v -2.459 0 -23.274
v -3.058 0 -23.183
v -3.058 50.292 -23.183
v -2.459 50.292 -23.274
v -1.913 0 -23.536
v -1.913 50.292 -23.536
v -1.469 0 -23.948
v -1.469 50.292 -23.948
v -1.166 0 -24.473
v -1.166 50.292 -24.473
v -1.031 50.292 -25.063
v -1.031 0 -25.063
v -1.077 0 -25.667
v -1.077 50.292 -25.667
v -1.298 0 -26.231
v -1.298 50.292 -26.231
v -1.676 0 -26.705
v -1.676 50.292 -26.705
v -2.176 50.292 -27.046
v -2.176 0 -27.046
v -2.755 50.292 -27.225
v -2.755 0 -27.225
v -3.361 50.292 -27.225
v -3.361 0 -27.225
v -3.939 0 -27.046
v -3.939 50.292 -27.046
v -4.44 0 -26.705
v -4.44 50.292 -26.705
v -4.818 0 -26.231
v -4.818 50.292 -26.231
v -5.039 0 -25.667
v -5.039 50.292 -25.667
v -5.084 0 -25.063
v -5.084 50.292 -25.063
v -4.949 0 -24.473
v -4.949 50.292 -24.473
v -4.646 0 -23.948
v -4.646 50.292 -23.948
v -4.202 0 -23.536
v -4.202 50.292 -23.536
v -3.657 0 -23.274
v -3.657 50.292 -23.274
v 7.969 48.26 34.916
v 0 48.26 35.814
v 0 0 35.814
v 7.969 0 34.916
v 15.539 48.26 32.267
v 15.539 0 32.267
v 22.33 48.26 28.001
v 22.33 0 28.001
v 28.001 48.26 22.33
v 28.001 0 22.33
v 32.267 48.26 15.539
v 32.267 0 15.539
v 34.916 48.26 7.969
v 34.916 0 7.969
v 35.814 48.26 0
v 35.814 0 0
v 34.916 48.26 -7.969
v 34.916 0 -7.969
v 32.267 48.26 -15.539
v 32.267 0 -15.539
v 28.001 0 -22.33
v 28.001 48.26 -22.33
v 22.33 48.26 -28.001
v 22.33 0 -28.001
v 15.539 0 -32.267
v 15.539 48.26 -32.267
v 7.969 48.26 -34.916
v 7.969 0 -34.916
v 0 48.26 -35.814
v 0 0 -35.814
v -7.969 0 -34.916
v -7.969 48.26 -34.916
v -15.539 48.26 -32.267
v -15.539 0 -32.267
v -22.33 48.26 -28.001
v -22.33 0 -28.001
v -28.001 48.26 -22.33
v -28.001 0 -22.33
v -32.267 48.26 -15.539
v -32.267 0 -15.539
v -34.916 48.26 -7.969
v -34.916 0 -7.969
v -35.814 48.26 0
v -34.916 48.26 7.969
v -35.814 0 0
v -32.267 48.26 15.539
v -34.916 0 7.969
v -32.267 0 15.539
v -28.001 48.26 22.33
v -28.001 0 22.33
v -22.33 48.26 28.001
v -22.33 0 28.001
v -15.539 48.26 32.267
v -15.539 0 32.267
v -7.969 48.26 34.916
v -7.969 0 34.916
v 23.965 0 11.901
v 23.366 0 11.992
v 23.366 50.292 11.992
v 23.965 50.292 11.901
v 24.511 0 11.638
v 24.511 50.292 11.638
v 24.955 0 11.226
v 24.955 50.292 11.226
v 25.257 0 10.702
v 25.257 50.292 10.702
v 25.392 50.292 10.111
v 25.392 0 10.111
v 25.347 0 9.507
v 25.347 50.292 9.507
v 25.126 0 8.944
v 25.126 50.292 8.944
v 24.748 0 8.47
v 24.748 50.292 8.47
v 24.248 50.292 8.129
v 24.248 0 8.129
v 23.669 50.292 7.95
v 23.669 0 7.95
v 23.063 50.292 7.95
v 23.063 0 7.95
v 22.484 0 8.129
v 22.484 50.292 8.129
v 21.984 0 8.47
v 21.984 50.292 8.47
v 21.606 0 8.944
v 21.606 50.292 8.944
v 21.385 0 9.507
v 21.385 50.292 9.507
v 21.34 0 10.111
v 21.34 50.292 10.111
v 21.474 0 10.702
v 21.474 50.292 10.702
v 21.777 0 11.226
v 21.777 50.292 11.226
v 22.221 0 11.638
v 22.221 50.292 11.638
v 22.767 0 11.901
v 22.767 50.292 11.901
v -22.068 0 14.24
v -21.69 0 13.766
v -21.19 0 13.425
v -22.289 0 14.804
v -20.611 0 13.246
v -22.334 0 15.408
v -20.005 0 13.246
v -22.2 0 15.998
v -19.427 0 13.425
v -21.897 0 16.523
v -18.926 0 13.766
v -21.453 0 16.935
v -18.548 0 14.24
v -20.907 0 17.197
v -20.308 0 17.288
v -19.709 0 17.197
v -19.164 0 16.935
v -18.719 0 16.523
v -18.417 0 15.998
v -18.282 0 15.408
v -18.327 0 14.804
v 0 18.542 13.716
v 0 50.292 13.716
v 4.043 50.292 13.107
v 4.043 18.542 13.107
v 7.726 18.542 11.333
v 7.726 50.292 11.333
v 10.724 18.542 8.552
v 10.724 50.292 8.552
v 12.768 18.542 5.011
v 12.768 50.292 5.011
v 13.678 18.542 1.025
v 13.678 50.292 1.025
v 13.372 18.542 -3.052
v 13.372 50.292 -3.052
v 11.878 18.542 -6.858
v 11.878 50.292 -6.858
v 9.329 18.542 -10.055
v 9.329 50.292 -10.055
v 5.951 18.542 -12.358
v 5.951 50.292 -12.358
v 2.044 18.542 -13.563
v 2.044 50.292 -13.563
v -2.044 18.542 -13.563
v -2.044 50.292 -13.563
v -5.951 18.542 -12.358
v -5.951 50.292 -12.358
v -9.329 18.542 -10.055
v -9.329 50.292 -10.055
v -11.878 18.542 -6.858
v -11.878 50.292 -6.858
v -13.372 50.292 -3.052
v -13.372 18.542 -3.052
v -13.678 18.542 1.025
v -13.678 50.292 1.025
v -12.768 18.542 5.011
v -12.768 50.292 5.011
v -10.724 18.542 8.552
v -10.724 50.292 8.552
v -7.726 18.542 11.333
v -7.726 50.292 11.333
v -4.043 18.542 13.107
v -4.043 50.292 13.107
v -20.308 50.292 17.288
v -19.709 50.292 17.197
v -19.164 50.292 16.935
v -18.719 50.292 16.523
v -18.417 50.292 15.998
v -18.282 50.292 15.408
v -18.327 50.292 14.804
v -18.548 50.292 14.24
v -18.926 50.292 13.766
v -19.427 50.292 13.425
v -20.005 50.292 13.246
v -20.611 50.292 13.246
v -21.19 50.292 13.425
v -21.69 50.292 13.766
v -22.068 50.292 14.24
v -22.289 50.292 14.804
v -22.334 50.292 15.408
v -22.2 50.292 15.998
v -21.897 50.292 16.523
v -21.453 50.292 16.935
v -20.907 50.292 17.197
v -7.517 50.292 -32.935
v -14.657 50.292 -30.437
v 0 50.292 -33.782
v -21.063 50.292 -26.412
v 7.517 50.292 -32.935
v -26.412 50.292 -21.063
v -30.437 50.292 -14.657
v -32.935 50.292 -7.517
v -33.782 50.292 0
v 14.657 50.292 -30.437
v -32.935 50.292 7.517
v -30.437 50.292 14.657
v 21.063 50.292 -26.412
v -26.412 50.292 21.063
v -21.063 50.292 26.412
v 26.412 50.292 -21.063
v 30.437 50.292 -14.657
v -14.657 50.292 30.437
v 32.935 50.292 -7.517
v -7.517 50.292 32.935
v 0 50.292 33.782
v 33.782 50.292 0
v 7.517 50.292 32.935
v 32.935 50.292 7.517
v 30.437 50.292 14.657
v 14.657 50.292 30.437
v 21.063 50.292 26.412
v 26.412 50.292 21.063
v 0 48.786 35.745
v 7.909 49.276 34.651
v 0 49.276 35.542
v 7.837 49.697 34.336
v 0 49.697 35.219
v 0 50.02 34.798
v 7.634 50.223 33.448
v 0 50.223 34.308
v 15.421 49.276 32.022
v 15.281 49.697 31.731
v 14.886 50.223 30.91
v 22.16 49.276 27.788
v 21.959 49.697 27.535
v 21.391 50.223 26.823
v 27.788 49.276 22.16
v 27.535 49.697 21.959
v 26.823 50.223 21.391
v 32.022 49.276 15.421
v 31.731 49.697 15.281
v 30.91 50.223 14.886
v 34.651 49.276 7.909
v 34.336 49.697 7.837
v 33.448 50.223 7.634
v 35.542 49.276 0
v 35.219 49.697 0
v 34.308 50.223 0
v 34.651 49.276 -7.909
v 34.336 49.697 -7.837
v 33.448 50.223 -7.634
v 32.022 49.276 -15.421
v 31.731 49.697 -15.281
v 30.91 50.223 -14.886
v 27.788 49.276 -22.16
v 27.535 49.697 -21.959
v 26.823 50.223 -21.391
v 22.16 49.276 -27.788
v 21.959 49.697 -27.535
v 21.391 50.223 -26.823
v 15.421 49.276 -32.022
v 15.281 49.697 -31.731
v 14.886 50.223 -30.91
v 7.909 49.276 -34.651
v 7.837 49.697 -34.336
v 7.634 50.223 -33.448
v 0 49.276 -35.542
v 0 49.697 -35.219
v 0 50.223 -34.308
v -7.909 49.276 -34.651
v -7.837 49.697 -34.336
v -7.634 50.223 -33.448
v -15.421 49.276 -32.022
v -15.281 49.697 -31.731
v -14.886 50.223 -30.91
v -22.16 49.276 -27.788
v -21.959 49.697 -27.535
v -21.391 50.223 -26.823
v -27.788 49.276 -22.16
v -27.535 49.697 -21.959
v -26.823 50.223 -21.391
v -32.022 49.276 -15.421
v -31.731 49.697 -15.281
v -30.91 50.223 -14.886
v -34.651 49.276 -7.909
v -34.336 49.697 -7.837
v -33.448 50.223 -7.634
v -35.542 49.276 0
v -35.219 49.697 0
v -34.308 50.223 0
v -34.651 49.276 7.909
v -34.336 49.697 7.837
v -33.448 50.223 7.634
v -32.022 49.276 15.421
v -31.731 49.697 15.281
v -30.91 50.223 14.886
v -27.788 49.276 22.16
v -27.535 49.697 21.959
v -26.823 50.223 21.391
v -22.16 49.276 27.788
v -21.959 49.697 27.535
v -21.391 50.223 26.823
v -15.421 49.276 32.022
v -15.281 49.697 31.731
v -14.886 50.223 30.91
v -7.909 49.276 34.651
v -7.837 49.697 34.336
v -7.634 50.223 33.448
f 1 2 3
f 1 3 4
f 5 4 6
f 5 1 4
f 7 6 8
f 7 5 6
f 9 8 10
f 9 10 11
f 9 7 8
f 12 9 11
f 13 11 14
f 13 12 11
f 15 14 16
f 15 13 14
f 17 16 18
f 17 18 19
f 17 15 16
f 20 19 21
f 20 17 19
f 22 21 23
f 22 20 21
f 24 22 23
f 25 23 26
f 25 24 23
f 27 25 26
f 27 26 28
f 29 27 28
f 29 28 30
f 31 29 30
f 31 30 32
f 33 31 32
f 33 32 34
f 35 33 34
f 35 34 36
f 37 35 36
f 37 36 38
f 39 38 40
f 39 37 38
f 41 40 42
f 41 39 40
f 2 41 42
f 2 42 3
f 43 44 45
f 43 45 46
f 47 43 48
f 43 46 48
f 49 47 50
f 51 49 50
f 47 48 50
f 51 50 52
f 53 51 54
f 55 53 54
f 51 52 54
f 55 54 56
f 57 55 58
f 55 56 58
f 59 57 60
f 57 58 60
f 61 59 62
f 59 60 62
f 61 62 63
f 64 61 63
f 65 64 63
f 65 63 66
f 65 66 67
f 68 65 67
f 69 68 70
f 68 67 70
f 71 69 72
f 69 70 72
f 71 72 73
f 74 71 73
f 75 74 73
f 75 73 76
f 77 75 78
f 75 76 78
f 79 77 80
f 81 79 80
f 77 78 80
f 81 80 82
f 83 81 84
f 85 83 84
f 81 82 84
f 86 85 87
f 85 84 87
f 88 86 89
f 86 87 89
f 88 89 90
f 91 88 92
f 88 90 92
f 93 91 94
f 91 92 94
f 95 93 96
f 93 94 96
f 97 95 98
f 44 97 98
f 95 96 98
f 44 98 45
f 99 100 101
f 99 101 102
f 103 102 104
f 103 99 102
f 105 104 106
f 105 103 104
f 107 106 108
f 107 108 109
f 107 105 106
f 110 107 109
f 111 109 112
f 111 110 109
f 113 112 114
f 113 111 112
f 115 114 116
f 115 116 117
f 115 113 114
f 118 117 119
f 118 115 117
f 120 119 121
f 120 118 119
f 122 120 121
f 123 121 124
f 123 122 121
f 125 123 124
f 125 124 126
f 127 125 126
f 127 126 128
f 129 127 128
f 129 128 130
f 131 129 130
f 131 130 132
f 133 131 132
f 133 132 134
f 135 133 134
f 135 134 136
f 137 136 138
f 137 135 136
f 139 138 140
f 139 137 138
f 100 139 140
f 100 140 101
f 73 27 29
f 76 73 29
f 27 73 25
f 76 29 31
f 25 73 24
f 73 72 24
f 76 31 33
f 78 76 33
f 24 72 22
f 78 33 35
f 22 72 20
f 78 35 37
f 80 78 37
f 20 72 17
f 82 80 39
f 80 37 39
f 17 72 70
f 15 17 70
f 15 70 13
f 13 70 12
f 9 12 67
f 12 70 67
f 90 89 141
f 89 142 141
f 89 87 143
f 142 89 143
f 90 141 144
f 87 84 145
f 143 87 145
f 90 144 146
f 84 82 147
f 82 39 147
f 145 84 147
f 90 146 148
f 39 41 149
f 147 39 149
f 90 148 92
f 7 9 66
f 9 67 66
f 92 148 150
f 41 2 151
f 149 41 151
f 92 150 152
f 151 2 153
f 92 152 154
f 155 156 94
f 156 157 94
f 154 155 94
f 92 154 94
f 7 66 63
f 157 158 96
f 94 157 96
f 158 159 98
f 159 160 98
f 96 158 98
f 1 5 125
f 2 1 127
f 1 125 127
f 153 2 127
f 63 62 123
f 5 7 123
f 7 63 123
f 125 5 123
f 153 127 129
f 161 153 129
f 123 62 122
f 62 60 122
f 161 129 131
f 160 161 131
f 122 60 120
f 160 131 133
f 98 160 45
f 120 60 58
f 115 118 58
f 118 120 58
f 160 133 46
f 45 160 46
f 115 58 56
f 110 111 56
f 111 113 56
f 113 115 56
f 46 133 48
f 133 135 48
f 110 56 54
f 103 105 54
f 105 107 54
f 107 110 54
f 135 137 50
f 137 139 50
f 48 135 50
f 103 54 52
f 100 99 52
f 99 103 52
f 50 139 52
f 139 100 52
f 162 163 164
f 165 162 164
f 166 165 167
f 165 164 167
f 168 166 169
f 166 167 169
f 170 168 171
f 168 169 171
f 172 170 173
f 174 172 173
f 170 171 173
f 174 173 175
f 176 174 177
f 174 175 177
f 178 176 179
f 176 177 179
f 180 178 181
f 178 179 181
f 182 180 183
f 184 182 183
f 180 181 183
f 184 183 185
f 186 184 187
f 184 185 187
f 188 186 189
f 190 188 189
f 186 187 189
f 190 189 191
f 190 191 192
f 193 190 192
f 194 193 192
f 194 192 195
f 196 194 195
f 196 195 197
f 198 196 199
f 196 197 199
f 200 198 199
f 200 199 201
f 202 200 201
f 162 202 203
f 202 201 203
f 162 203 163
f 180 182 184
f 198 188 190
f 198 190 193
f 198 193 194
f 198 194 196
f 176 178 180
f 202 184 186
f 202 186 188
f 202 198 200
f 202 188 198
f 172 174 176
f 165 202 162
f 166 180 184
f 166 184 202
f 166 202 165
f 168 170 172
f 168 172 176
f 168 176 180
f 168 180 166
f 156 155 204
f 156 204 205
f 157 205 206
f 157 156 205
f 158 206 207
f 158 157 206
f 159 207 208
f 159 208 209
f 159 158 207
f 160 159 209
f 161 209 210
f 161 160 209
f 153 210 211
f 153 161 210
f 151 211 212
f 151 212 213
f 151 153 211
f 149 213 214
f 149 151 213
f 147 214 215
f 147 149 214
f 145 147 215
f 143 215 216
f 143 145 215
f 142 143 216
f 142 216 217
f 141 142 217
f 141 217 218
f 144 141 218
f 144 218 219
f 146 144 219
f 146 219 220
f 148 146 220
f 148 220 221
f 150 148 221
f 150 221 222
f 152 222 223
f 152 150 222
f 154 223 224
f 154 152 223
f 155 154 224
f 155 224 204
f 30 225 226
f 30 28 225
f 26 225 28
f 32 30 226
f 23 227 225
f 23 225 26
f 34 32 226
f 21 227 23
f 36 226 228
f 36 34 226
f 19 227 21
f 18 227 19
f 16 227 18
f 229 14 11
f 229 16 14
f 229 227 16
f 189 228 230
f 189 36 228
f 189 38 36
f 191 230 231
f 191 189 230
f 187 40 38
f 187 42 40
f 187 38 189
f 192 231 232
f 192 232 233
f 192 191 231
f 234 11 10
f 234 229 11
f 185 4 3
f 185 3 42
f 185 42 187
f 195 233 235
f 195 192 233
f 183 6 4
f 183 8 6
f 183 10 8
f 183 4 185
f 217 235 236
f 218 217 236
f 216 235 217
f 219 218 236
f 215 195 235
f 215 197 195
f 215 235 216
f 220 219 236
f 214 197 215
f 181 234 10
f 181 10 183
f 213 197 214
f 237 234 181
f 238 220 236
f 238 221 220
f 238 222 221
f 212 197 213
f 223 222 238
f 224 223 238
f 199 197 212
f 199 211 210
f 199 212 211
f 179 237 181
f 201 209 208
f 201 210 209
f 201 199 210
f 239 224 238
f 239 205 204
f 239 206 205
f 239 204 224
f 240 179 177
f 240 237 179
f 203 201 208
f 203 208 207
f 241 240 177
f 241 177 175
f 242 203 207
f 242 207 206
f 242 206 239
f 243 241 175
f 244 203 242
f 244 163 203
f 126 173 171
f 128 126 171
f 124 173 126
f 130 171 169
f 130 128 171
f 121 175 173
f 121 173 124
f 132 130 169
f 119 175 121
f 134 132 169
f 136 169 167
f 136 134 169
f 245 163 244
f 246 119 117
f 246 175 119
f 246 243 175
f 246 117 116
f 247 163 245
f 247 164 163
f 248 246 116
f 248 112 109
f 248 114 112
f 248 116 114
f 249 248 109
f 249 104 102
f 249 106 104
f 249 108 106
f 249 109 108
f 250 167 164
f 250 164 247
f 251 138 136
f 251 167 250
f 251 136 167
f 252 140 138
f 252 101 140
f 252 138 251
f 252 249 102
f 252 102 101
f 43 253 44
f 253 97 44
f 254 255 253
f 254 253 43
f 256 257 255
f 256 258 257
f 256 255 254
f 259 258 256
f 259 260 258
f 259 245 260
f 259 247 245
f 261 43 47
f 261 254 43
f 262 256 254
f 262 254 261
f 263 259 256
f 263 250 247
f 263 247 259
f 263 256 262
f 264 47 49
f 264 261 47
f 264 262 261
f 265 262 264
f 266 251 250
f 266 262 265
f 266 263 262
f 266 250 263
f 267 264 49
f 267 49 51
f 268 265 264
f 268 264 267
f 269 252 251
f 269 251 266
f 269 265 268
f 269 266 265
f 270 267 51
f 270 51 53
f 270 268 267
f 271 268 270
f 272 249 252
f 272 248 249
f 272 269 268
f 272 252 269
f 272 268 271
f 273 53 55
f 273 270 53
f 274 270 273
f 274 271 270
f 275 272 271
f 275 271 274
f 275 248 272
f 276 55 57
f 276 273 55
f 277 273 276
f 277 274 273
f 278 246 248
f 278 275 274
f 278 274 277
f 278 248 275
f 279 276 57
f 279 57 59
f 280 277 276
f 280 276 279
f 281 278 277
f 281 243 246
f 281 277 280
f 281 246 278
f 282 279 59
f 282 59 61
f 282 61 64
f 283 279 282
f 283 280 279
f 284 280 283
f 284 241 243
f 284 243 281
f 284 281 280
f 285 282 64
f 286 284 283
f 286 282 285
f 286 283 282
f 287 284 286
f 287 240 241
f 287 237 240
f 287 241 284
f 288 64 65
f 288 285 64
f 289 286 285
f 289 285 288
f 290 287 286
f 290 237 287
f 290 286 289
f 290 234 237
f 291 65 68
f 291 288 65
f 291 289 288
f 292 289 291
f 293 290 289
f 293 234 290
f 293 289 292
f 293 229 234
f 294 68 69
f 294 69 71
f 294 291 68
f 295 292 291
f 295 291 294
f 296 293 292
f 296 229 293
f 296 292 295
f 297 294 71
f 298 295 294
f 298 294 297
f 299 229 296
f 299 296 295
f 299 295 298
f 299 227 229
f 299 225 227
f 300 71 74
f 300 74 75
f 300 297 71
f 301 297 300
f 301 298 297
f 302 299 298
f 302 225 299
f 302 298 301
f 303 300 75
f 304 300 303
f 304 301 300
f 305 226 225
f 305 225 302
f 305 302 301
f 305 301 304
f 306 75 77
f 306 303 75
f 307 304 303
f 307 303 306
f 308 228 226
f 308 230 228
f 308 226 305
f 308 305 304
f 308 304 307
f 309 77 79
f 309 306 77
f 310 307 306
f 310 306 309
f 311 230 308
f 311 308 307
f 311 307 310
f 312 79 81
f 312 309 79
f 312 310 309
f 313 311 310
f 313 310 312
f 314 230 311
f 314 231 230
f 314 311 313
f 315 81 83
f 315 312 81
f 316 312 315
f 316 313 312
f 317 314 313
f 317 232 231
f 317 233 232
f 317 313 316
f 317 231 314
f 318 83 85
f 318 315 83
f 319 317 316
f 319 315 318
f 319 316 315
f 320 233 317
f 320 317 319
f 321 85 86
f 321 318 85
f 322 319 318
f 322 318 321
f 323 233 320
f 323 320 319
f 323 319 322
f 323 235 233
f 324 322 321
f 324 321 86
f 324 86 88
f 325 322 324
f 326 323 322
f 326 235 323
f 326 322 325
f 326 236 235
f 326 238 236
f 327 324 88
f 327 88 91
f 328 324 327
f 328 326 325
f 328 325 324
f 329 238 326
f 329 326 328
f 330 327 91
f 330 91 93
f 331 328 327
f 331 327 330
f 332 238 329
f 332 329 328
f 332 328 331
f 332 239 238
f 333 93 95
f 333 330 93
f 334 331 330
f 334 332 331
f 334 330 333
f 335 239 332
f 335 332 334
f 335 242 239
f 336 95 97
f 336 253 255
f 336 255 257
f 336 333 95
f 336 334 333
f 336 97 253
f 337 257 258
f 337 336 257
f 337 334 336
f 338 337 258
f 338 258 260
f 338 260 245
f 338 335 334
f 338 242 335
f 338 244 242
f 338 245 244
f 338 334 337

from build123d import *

# Parameters (mm, degrees)
SKETCH1_R           = 35.814
SKETCH1_R_2         = 2.032
BOSS_EXTRUDE1_DEPTH = 50.292
SKETCH2_R           = 13.716
CUT_EXTRUDE1_DEPTH  = 31.75
FILLET1_R           = 2.032


with BuildPart() as part:
    # Sketch1 → Boss-Extrude1 (new body)
    with BuildSketch(Plane(origin=(0, 0, 0), x_dir=(1, 0, 0), z_dir=(0, 1, 0))):
        with Locations(Location((0, 0, 0), (0, 0, 270))):
            Circle(SKETCH1_R)
        with Locations(Location((-20.308177359, -15.255750796, 0), (0, 0, 270))):
            Circle(SKETCH1_R_2, mode=Mode.SUBTRACT)
        with Locations(Location((-3.057779064, 25.215272896, 0), (0, 0, 270))):
            Circle(SKETCH1_R_2, mode=Mode.SUBTRACT)
        with Locations(Location((23.365956423, -9.959522099, 0), (0, 0, 270))):
            Circle(SKETCH1_R_2, mode=Mode.SUBTRACT)
    extrude(amount=BOSS_EXTRUDE1_DEPTH)

    # Sketch2 → Cut-Extrude1 (cut)
    with BuildSketch(Plane(origin=(0, 50.292, 0), x_dir=(1, 0, 0), z_dir=(0, 1, 0))):
        with Locations(Location((0, 0, 0), (0, 0, 270))):
            Circle(SKETCH2_R)
    extrude(amount=-CUT_EXTRUDE1_DEPTH, mode=Mode.SUBTRACT)

    # Fillet1
    fillet1_edges = [part.edges().sort_by_distance(p)[0] for p in [
        (0, 50.292, -35.814),
    ]]
    fillet(fillet1_edges, radius=FILLET1_R)


solid = part.part
